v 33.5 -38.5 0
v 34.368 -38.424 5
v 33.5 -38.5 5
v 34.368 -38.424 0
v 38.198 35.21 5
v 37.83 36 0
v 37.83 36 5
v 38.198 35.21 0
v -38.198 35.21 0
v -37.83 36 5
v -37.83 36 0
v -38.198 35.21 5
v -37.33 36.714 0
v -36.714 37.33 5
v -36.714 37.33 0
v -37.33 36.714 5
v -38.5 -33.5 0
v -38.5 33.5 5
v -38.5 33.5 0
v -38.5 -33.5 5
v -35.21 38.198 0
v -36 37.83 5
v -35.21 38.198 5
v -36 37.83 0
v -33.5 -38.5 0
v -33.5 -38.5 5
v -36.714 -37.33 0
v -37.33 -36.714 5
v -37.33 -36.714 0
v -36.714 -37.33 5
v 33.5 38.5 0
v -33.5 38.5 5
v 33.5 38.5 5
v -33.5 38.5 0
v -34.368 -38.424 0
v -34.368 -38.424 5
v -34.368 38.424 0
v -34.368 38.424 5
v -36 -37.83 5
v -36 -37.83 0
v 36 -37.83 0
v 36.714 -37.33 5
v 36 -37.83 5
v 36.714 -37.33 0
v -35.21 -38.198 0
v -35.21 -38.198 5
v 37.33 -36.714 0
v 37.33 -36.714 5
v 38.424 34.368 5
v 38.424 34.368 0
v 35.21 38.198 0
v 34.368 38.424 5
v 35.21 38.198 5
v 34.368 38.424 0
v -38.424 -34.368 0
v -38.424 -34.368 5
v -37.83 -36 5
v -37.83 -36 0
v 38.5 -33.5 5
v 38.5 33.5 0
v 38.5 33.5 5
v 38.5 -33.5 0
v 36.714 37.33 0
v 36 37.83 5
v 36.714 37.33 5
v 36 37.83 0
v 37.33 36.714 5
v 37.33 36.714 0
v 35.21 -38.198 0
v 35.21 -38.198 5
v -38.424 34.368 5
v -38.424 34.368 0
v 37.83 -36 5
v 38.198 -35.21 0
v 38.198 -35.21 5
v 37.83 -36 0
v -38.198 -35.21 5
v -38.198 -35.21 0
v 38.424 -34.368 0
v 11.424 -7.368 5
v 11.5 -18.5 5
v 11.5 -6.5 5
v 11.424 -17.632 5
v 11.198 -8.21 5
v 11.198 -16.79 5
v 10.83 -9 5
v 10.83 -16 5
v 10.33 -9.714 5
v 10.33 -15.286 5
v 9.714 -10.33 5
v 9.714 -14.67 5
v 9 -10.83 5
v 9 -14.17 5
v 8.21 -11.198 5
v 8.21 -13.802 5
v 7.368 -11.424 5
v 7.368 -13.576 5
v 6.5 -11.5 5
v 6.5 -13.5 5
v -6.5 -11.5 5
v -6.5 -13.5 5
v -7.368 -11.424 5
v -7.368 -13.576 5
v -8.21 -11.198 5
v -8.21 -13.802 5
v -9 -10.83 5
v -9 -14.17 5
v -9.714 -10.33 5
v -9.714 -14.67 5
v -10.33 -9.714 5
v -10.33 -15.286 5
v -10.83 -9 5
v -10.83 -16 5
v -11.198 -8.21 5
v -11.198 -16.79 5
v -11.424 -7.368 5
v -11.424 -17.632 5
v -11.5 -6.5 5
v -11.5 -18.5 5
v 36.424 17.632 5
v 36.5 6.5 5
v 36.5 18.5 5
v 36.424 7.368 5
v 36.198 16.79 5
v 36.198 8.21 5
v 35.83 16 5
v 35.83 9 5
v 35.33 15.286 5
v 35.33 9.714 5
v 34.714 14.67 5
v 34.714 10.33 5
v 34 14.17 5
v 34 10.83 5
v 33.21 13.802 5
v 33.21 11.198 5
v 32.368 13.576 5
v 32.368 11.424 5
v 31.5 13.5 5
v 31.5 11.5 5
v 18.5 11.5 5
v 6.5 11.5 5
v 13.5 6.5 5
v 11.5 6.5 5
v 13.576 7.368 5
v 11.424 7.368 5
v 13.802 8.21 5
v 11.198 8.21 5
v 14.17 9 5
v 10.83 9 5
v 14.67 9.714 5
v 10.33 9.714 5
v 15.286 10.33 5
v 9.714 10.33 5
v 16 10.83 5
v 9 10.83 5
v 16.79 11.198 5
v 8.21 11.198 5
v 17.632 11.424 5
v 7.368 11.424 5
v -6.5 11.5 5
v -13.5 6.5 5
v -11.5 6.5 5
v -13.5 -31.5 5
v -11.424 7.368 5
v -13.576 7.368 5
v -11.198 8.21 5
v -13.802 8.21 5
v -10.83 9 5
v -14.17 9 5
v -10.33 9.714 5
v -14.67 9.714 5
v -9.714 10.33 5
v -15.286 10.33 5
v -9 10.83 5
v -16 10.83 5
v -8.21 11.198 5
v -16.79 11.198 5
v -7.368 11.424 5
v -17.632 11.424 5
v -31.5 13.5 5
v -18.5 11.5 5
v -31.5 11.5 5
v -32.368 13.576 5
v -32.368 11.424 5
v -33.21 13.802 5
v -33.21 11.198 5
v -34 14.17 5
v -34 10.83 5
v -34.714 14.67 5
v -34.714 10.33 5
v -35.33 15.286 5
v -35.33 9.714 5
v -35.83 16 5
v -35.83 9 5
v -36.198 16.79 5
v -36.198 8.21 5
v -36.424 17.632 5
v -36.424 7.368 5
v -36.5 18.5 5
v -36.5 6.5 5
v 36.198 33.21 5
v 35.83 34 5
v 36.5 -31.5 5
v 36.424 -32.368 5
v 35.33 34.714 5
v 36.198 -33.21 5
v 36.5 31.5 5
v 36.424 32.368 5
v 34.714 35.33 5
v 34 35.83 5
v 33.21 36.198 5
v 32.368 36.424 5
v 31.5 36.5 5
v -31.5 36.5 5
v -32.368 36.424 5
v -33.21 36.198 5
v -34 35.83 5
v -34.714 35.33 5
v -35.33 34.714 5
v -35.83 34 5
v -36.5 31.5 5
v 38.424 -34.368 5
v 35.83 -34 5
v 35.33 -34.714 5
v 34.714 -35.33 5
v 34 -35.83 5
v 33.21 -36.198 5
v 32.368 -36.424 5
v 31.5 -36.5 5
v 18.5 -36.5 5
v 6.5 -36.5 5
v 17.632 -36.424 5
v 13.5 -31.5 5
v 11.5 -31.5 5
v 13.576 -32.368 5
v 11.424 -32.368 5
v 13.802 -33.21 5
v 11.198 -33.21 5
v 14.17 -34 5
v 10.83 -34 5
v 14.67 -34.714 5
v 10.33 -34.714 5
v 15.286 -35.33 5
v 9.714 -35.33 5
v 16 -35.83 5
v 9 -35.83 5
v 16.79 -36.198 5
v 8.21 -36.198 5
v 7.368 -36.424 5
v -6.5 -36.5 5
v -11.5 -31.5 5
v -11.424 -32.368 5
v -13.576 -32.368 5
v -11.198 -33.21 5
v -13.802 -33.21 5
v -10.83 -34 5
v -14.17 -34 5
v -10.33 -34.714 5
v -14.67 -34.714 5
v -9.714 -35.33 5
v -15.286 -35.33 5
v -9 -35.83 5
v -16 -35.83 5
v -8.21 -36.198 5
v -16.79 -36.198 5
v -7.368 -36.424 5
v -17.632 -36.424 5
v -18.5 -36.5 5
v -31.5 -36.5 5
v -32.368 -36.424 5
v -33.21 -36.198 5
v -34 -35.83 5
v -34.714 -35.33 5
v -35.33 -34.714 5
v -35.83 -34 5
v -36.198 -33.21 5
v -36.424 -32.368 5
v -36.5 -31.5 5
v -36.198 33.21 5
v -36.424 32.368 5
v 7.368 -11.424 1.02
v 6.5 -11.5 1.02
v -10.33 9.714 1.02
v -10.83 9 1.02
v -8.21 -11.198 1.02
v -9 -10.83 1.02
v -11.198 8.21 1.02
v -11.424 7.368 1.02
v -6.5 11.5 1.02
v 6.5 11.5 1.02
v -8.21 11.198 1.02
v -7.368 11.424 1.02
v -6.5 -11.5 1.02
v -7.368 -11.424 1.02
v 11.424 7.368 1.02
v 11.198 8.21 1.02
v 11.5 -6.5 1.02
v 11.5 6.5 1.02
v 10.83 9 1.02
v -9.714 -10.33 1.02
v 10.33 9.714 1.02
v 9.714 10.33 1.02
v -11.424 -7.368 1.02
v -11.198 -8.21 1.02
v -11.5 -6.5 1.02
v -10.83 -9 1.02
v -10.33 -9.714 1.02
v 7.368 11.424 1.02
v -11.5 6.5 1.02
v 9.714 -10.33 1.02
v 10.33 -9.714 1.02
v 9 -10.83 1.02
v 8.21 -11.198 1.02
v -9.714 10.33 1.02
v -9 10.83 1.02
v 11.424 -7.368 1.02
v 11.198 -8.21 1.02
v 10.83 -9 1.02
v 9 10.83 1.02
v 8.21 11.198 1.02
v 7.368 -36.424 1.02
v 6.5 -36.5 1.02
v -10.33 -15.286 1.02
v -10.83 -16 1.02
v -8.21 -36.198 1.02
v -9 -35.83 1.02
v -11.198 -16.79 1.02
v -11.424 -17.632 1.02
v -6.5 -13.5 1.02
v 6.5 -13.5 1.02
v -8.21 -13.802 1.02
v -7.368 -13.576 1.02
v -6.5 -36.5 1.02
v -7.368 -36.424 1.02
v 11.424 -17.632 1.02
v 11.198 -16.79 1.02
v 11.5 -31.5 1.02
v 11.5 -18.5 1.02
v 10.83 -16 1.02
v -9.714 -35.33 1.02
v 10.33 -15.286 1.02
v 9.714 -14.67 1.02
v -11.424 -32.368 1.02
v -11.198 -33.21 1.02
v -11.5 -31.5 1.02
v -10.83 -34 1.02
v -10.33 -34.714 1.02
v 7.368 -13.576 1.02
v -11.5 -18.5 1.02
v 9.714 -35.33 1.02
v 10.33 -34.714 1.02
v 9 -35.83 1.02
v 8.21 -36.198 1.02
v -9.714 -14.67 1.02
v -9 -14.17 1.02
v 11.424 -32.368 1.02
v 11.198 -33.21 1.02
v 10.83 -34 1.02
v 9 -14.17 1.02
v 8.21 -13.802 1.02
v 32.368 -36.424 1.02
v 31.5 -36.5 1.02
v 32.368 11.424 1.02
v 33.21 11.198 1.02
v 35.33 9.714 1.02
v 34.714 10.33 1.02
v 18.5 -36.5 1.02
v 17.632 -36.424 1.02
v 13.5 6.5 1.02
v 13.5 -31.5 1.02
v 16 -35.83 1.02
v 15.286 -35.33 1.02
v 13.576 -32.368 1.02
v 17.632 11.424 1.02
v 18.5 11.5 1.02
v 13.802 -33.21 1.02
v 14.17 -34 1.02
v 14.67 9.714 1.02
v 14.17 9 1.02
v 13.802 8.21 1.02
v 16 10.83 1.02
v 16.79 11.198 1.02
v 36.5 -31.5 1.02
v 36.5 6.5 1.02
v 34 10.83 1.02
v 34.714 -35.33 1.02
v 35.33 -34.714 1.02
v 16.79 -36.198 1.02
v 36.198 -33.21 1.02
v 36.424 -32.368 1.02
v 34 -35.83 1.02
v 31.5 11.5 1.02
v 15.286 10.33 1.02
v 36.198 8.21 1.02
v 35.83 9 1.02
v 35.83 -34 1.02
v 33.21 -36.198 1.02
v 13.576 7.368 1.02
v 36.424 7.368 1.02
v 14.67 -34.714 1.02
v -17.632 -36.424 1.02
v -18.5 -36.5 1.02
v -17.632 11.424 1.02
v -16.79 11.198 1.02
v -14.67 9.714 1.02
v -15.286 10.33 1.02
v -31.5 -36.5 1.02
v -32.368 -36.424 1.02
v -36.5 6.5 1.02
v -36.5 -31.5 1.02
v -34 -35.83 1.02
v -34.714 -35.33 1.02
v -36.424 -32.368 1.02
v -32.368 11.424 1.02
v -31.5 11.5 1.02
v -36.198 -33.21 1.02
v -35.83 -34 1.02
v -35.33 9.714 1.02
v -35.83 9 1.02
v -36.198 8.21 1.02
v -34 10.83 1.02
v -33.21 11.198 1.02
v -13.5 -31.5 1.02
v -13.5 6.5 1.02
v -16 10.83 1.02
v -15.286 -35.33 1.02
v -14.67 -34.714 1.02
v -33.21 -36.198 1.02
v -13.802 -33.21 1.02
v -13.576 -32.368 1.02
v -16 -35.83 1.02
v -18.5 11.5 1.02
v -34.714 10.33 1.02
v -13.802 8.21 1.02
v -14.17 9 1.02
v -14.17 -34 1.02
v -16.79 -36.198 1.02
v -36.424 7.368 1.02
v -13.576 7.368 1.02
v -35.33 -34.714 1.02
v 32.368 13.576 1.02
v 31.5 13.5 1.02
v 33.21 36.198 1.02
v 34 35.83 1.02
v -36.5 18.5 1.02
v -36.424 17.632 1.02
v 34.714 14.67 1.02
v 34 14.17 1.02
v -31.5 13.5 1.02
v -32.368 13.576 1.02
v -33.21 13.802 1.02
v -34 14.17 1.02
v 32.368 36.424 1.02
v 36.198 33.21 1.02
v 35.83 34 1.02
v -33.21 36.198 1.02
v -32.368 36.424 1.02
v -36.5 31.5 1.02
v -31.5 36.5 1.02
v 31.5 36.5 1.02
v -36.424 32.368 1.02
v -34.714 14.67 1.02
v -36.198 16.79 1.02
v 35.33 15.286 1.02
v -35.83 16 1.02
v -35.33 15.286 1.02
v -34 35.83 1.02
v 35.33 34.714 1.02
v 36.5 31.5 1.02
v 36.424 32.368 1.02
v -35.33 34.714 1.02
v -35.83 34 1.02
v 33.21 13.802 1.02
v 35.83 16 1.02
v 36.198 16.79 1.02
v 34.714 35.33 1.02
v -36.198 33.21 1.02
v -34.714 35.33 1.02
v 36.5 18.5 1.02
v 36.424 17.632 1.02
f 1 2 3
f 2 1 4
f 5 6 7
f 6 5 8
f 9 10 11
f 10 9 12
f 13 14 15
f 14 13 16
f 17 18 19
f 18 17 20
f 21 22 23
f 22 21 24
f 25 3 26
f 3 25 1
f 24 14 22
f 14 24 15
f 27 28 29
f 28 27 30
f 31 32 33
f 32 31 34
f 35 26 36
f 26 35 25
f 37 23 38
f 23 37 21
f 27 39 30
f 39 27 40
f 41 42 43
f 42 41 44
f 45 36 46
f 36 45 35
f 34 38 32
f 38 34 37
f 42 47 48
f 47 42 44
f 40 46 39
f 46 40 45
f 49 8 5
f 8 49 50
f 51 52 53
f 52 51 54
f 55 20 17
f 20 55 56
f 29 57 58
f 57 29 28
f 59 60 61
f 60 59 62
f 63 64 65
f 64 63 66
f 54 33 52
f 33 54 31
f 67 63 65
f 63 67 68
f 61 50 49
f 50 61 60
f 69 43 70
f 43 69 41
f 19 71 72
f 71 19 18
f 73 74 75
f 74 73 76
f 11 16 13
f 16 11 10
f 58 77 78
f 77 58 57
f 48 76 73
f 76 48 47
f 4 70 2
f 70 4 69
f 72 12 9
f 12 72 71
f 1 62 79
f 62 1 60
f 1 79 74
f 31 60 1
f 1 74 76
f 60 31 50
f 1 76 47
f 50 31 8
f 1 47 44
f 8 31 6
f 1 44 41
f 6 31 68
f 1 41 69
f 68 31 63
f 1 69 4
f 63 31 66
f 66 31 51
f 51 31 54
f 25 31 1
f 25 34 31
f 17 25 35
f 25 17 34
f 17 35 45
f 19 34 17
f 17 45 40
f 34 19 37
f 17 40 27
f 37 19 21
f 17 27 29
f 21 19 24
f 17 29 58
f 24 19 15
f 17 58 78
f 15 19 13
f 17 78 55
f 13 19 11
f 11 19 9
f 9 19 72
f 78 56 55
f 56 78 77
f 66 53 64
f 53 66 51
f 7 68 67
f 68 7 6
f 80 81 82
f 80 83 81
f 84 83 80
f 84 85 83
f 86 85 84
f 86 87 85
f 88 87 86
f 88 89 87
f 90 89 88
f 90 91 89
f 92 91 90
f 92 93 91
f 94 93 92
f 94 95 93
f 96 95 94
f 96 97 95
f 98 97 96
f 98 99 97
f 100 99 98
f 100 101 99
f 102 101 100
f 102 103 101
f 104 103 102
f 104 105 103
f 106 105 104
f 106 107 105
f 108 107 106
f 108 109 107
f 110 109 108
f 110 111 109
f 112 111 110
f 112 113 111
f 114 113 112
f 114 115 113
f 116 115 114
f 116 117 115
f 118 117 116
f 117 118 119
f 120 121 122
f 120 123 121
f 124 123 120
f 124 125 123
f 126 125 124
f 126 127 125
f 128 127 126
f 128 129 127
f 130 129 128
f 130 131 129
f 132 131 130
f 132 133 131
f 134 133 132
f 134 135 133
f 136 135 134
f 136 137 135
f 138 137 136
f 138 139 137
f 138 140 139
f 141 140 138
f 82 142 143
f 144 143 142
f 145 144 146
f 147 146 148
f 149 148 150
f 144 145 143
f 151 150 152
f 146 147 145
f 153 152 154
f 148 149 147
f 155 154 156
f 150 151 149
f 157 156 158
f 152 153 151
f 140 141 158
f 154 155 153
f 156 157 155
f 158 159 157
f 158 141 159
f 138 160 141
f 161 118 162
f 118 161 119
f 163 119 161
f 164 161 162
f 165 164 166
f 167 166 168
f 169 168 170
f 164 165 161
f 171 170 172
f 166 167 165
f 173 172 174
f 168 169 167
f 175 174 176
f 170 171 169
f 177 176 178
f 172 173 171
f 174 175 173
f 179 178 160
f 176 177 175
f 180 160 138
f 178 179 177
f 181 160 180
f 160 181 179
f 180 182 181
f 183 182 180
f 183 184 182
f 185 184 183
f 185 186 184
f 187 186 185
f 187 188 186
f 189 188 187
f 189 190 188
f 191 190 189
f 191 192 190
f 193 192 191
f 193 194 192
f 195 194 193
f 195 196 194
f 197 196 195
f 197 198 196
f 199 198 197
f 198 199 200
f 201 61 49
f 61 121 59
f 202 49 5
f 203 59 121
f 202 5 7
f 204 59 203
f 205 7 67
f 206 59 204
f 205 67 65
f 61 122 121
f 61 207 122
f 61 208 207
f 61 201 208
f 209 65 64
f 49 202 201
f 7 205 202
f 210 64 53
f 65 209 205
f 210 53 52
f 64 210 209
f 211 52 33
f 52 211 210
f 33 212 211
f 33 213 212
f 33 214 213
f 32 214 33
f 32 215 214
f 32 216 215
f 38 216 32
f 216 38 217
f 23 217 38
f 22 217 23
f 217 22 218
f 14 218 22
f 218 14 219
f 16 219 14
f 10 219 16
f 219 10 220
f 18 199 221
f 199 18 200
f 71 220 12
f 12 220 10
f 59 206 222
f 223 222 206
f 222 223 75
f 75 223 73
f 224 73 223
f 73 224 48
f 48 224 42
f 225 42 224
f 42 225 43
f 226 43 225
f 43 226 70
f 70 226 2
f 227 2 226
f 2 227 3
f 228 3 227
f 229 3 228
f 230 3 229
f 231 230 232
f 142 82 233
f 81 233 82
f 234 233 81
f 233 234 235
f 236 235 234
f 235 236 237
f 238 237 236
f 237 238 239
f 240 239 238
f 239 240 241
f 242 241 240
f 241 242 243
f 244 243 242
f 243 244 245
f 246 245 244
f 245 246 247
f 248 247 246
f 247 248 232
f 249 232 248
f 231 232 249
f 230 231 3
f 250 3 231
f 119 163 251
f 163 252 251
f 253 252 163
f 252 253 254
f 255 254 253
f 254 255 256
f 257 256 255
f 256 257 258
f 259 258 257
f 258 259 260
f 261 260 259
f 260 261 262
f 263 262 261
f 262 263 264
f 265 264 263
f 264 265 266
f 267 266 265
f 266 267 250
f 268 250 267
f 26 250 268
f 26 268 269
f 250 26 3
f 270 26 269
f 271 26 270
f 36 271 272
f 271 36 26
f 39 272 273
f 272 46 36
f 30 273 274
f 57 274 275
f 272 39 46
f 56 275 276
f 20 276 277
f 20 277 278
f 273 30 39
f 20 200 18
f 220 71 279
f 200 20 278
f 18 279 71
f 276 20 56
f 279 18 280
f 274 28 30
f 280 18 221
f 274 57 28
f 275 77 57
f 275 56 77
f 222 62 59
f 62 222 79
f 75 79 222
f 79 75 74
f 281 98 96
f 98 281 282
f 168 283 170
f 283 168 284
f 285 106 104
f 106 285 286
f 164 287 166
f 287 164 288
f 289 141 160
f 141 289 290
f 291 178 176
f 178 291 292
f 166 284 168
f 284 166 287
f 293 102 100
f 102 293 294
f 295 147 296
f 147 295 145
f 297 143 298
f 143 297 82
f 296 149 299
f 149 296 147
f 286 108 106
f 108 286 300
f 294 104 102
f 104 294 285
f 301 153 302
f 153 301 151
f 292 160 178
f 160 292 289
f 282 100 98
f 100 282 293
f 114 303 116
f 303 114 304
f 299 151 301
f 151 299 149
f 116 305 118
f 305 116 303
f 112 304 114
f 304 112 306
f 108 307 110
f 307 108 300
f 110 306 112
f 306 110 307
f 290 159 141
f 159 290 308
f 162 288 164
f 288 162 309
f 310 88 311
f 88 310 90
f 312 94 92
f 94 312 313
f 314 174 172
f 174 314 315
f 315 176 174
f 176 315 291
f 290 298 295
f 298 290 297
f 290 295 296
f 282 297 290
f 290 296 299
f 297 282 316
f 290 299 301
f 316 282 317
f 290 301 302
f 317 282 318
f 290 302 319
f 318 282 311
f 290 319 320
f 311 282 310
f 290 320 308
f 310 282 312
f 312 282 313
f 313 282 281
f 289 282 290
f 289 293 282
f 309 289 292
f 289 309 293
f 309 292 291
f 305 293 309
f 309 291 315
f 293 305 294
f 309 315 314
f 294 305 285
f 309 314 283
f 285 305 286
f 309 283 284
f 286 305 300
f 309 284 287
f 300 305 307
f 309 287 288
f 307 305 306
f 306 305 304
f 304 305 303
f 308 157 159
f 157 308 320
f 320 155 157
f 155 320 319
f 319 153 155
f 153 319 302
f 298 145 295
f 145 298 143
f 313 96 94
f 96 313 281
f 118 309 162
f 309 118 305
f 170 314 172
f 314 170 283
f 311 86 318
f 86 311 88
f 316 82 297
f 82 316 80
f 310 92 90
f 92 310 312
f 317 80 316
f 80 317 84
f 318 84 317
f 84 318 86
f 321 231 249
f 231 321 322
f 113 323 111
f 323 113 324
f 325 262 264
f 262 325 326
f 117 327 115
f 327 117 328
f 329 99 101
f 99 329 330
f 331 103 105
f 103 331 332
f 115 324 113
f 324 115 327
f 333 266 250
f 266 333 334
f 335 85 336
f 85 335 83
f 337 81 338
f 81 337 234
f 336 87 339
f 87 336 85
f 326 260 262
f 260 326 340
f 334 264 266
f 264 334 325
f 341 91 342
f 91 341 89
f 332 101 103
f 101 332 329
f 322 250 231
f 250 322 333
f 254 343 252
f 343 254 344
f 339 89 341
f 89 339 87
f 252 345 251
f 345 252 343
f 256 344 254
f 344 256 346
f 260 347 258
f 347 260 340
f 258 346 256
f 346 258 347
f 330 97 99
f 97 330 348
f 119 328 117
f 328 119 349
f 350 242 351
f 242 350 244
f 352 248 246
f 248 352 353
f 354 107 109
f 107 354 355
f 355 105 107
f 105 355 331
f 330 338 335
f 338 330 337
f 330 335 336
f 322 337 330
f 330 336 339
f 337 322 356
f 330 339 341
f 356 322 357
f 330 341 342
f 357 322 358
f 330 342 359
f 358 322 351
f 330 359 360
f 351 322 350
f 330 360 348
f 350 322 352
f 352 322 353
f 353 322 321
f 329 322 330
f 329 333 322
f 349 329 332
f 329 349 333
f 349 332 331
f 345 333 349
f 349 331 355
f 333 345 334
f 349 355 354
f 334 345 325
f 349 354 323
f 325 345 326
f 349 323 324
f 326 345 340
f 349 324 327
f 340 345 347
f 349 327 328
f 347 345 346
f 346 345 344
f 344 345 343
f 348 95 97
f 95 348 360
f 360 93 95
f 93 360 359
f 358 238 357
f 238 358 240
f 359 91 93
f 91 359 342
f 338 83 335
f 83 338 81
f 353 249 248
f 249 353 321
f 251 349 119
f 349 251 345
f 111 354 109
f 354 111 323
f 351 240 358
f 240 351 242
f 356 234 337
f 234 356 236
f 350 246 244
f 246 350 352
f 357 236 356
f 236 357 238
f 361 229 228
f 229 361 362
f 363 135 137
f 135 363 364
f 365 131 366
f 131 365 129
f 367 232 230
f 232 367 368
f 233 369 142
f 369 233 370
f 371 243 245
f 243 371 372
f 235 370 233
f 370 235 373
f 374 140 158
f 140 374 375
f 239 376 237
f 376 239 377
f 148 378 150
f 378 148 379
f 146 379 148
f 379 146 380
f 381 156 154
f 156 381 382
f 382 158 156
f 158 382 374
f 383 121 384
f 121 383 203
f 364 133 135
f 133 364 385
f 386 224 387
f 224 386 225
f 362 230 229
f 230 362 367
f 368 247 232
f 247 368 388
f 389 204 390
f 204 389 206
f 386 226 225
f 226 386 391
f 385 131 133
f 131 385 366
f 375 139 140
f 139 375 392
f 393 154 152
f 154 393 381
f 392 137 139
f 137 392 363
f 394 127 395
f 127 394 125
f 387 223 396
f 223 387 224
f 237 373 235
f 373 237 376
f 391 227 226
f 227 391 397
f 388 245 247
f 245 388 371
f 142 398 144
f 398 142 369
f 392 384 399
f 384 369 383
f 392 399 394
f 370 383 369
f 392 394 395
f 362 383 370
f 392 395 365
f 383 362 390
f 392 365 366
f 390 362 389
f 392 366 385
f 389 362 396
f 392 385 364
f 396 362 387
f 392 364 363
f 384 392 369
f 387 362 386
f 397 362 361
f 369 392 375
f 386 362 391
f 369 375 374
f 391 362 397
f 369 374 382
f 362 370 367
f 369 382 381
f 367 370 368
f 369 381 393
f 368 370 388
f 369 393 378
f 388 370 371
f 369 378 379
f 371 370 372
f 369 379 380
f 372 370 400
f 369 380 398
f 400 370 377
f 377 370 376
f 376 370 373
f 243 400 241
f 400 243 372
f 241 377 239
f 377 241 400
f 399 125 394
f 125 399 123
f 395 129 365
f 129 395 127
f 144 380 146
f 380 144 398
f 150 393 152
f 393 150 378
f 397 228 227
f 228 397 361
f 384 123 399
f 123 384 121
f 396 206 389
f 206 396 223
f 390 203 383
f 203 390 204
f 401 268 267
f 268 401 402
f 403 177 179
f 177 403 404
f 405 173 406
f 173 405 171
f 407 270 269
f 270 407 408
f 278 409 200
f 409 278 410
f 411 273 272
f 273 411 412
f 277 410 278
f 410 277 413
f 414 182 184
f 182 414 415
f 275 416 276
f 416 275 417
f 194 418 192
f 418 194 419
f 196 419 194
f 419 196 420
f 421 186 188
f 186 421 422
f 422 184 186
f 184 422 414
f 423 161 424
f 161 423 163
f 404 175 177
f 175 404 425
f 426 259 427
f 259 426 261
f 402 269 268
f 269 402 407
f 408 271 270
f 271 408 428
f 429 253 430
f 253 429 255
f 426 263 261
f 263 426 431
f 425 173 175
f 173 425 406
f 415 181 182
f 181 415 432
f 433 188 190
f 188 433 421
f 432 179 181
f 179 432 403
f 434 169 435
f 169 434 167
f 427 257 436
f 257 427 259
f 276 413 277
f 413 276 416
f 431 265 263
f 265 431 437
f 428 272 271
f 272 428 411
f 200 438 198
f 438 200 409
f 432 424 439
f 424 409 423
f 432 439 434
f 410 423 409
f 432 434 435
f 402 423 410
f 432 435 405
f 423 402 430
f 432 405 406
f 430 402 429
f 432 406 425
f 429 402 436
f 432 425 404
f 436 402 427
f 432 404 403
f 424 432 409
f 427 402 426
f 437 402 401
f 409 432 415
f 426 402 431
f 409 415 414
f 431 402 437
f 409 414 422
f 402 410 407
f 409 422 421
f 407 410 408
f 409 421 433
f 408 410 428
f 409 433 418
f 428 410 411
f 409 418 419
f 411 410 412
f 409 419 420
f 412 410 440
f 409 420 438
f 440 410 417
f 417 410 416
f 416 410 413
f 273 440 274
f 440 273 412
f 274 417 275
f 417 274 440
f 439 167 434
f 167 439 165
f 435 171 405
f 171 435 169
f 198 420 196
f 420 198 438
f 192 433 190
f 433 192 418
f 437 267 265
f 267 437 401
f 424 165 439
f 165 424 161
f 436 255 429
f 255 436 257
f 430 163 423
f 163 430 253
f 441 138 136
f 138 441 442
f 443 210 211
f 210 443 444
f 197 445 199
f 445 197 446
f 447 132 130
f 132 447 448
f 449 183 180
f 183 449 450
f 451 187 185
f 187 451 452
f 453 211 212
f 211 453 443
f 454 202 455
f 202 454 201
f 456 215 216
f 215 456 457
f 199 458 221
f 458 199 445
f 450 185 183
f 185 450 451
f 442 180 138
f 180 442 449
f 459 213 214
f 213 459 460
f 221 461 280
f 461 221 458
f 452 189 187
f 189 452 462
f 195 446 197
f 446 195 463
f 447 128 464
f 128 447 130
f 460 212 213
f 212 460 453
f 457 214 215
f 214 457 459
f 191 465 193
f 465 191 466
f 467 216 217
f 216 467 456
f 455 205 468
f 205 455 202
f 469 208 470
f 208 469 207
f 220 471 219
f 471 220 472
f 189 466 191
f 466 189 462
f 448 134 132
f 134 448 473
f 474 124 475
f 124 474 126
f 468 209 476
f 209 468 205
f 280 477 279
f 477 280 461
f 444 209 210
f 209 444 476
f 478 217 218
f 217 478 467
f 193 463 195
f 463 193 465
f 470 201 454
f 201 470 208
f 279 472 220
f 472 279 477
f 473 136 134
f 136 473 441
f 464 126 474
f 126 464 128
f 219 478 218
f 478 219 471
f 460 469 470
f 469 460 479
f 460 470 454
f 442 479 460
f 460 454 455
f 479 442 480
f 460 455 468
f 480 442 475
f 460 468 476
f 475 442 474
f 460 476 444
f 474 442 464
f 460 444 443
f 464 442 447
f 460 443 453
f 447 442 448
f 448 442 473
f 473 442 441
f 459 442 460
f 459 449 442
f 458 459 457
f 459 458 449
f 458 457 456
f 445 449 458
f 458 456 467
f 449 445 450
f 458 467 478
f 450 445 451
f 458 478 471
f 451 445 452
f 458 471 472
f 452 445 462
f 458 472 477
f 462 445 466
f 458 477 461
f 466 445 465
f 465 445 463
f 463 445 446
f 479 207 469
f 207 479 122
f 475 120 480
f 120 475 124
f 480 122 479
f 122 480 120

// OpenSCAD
side = 75;
height = 5;
depth = 4;
rounding = 5;
wall = 4;

E = 0.02;

module _round() {
    $fn = 36;

    offset(rounding)
    offset(- rounding)
        children();
}


module base() {
    linear_extrude(height)
    _round()
        square([side, side] + [wall, wall] / 2, center = true);
}


module compartment(dim) {
    module shape() {
        linear_extrude(dim.z)
        _round()
            square([dim.x, dim.y], center = true);
    }

    translate([0, 0, height - dim.z + E])
        shape();
}


module compartment_1x1() {
    compartment([side / 3, side / 3, depth] - [wall, wall, 0] / 2);
}

module compartment_1x2() {
    compartment([side / 3, side * 2 / 3, depth] - [wall, wall, 0] / 2);
}

module compartment_3x1() {
    compartment([side, side / 3, depth] - [wall, wall, 0] / 2);
}


module tray() {
    difference() {
        base();

        compartment_1x1();

        translate([0, - side / 3, 0])
            compartment_1x1();

        translate([side / 3, - side / 6, 0])
            compartment_1x2();

        translate([- side / 3, - side / 6, 0])
            compartment_1x2();

        translate([0, side / 3, 0])
            compartment_3x1();
    }
}


tray();
